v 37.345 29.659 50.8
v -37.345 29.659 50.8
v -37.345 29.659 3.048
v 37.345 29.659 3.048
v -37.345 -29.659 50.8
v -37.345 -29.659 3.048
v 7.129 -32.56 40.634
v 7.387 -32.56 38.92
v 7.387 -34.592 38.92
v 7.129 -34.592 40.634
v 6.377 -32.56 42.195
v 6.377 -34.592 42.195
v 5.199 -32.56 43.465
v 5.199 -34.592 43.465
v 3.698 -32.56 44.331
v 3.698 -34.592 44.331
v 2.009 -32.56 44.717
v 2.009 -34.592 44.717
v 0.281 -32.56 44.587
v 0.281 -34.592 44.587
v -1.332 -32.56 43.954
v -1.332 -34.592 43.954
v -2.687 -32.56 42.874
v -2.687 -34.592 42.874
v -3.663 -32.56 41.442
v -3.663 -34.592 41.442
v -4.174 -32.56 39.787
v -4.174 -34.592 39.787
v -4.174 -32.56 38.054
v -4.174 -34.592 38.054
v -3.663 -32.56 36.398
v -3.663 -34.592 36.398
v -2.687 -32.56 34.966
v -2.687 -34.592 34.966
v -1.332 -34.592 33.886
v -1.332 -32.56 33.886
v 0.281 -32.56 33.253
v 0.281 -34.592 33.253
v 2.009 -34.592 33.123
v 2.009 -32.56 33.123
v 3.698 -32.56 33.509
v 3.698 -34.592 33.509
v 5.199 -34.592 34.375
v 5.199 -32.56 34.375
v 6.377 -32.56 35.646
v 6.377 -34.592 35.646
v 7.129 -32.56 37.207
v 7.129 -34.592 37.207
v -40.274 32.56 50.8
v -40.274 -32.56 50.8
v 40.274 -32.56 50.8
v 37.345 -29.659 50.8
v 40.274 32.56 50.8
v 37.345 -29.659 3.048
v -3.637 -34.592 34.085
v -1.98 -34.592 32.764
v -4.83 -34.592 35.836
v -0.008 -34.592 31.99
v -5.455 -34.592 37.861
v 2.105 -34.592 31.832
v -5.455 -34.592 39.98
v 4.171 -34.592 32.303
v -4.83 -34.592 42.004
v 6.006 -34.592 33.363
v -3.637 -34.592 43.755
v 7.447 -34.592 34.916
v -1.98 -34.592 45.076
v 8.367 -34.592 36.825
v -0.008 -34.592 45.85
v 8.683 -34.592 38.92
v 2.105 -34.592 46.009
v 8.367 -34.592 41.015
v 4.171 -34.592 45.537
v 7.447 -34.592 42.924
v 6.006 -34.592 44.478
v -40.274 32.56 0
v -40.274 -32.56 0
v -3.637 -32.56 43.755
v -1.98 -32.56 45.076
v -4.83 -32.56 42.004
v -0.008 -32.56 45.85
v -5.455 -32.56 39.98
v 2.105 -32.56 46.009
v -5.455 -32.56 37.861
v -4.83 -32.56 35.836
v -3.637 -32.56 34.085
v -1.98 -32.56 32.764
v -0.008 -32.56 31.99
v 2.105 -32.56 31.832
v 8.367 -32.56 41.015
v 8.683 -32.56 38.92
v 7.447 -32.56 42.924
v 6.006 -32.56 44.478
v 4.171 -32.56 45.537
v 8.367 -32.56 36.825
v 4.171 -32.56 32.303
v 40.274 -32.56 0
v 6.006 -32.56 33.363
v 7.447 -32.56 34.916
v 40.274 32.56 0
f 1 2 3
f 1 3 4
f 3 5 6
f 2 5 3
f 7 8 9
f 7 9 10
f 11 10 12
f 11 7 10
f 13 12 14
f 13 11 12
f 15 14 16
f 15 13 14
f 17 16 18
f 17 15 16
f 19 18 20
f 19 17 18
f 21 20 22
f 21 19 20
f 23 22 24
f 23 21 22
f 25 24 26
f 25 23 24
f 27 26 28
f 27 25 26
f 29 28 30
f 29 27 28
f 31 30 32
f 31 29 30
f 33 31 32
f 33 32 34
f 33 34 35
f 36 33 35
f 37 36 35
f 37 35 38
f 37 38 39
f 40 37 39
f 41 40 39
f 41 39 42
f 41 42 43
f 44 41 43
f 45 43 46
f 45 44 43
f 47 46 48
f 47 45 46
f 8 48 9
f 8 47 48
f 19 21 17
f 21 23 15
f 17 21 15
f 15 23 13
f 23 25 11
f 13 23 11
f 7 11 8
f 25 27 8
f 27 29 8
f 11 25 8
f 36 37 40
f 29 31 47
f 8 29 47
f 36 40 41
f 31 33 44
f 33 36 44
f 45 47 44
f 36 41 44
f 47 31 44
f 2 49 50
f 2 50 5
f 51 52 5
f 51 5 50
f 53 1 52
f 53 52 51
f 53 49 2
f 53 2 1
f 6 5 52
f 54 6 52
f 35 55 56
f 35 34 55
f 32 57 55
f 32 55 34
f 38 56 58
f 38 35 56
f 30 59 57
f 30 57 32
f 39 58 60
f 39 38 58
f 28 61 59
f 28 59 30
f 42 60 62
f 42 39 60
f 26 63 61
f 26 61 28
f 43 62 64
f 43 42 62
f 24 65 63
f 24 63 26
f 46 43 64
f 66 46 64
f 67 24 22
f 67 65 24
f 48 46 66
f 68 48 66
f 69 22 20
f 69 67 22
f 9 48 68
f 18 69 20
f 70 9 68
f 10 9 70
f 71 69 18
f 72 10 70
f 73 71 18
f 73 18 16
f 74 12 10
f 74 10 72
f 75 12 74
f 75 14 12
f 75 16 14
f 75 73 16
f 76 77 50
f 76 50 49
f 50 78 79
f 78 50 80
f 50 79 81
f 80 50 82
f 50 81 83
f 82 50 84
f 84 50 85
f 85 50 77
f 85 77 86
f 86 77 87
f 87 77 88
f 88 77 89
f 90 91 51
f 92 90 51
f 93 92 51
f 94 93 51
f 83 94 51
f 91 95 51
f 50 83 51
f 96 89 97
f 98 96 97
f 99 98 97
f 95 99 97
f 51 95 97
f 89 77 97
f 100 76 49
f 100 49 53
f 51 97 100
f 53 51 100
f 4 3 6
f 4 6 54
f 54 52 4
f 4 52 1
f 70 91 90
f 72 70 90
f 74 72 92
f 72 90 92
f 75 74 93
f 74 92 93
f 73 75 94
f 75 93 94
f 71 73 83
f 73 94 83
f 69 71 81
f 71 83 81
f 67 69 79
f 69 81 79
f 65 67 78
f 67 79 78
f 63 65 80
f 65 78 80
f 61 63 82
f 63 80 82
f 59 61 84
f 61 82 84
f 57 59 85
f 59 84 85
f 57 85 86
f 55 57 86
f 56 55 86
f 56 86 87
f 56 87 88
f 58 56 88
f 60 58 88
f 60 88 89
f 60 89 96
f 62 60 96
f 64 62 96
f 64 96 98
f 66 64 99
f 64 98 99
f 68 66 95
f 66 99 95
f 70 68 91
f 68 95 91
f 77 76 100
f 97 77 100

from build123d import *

# Parameters (mm, degrees)
F0_W     = 80.548994
F0_H     = 65.119892
F1_DEPTH = 50.8
F2_W     = 74.689142
F2_H     = 59.31776
F3_DEPTH = 47.752
F4_R     = 7.108362
F4_R_2   = 5.812962
F5_DEPTH = 2.032


with BuildPart() as f1:
    # F0 (on Top) → F1 (new body)
    with BuildSketch(Plane.XY):
        Rectangle(F0_W, F0_H)
    extrude(amount=F1_DEPTH)

    # F2 (on face) → F3 (cut)
    with BuildSketch(Plane.XY.offset(50.8)):
        Rectangle(F2_W, F2_H)
    extrude(amount=-F3_DEPTH, mode=Mode.SUBTRACT)

    # F4 (on face) → F5 (join)
    with BuildSketch(Plane.XZ.offset(32.559946)):
        with Locations((1.574243, 38.920175)):
            Circle(F4_R)
        with Locations((1.574243, 38.920175)):
            Circle(F4_R_2, mode=Mode.SUBTRACT)
    extrude(amount=F5_DEPTH)


solid = f1.part
